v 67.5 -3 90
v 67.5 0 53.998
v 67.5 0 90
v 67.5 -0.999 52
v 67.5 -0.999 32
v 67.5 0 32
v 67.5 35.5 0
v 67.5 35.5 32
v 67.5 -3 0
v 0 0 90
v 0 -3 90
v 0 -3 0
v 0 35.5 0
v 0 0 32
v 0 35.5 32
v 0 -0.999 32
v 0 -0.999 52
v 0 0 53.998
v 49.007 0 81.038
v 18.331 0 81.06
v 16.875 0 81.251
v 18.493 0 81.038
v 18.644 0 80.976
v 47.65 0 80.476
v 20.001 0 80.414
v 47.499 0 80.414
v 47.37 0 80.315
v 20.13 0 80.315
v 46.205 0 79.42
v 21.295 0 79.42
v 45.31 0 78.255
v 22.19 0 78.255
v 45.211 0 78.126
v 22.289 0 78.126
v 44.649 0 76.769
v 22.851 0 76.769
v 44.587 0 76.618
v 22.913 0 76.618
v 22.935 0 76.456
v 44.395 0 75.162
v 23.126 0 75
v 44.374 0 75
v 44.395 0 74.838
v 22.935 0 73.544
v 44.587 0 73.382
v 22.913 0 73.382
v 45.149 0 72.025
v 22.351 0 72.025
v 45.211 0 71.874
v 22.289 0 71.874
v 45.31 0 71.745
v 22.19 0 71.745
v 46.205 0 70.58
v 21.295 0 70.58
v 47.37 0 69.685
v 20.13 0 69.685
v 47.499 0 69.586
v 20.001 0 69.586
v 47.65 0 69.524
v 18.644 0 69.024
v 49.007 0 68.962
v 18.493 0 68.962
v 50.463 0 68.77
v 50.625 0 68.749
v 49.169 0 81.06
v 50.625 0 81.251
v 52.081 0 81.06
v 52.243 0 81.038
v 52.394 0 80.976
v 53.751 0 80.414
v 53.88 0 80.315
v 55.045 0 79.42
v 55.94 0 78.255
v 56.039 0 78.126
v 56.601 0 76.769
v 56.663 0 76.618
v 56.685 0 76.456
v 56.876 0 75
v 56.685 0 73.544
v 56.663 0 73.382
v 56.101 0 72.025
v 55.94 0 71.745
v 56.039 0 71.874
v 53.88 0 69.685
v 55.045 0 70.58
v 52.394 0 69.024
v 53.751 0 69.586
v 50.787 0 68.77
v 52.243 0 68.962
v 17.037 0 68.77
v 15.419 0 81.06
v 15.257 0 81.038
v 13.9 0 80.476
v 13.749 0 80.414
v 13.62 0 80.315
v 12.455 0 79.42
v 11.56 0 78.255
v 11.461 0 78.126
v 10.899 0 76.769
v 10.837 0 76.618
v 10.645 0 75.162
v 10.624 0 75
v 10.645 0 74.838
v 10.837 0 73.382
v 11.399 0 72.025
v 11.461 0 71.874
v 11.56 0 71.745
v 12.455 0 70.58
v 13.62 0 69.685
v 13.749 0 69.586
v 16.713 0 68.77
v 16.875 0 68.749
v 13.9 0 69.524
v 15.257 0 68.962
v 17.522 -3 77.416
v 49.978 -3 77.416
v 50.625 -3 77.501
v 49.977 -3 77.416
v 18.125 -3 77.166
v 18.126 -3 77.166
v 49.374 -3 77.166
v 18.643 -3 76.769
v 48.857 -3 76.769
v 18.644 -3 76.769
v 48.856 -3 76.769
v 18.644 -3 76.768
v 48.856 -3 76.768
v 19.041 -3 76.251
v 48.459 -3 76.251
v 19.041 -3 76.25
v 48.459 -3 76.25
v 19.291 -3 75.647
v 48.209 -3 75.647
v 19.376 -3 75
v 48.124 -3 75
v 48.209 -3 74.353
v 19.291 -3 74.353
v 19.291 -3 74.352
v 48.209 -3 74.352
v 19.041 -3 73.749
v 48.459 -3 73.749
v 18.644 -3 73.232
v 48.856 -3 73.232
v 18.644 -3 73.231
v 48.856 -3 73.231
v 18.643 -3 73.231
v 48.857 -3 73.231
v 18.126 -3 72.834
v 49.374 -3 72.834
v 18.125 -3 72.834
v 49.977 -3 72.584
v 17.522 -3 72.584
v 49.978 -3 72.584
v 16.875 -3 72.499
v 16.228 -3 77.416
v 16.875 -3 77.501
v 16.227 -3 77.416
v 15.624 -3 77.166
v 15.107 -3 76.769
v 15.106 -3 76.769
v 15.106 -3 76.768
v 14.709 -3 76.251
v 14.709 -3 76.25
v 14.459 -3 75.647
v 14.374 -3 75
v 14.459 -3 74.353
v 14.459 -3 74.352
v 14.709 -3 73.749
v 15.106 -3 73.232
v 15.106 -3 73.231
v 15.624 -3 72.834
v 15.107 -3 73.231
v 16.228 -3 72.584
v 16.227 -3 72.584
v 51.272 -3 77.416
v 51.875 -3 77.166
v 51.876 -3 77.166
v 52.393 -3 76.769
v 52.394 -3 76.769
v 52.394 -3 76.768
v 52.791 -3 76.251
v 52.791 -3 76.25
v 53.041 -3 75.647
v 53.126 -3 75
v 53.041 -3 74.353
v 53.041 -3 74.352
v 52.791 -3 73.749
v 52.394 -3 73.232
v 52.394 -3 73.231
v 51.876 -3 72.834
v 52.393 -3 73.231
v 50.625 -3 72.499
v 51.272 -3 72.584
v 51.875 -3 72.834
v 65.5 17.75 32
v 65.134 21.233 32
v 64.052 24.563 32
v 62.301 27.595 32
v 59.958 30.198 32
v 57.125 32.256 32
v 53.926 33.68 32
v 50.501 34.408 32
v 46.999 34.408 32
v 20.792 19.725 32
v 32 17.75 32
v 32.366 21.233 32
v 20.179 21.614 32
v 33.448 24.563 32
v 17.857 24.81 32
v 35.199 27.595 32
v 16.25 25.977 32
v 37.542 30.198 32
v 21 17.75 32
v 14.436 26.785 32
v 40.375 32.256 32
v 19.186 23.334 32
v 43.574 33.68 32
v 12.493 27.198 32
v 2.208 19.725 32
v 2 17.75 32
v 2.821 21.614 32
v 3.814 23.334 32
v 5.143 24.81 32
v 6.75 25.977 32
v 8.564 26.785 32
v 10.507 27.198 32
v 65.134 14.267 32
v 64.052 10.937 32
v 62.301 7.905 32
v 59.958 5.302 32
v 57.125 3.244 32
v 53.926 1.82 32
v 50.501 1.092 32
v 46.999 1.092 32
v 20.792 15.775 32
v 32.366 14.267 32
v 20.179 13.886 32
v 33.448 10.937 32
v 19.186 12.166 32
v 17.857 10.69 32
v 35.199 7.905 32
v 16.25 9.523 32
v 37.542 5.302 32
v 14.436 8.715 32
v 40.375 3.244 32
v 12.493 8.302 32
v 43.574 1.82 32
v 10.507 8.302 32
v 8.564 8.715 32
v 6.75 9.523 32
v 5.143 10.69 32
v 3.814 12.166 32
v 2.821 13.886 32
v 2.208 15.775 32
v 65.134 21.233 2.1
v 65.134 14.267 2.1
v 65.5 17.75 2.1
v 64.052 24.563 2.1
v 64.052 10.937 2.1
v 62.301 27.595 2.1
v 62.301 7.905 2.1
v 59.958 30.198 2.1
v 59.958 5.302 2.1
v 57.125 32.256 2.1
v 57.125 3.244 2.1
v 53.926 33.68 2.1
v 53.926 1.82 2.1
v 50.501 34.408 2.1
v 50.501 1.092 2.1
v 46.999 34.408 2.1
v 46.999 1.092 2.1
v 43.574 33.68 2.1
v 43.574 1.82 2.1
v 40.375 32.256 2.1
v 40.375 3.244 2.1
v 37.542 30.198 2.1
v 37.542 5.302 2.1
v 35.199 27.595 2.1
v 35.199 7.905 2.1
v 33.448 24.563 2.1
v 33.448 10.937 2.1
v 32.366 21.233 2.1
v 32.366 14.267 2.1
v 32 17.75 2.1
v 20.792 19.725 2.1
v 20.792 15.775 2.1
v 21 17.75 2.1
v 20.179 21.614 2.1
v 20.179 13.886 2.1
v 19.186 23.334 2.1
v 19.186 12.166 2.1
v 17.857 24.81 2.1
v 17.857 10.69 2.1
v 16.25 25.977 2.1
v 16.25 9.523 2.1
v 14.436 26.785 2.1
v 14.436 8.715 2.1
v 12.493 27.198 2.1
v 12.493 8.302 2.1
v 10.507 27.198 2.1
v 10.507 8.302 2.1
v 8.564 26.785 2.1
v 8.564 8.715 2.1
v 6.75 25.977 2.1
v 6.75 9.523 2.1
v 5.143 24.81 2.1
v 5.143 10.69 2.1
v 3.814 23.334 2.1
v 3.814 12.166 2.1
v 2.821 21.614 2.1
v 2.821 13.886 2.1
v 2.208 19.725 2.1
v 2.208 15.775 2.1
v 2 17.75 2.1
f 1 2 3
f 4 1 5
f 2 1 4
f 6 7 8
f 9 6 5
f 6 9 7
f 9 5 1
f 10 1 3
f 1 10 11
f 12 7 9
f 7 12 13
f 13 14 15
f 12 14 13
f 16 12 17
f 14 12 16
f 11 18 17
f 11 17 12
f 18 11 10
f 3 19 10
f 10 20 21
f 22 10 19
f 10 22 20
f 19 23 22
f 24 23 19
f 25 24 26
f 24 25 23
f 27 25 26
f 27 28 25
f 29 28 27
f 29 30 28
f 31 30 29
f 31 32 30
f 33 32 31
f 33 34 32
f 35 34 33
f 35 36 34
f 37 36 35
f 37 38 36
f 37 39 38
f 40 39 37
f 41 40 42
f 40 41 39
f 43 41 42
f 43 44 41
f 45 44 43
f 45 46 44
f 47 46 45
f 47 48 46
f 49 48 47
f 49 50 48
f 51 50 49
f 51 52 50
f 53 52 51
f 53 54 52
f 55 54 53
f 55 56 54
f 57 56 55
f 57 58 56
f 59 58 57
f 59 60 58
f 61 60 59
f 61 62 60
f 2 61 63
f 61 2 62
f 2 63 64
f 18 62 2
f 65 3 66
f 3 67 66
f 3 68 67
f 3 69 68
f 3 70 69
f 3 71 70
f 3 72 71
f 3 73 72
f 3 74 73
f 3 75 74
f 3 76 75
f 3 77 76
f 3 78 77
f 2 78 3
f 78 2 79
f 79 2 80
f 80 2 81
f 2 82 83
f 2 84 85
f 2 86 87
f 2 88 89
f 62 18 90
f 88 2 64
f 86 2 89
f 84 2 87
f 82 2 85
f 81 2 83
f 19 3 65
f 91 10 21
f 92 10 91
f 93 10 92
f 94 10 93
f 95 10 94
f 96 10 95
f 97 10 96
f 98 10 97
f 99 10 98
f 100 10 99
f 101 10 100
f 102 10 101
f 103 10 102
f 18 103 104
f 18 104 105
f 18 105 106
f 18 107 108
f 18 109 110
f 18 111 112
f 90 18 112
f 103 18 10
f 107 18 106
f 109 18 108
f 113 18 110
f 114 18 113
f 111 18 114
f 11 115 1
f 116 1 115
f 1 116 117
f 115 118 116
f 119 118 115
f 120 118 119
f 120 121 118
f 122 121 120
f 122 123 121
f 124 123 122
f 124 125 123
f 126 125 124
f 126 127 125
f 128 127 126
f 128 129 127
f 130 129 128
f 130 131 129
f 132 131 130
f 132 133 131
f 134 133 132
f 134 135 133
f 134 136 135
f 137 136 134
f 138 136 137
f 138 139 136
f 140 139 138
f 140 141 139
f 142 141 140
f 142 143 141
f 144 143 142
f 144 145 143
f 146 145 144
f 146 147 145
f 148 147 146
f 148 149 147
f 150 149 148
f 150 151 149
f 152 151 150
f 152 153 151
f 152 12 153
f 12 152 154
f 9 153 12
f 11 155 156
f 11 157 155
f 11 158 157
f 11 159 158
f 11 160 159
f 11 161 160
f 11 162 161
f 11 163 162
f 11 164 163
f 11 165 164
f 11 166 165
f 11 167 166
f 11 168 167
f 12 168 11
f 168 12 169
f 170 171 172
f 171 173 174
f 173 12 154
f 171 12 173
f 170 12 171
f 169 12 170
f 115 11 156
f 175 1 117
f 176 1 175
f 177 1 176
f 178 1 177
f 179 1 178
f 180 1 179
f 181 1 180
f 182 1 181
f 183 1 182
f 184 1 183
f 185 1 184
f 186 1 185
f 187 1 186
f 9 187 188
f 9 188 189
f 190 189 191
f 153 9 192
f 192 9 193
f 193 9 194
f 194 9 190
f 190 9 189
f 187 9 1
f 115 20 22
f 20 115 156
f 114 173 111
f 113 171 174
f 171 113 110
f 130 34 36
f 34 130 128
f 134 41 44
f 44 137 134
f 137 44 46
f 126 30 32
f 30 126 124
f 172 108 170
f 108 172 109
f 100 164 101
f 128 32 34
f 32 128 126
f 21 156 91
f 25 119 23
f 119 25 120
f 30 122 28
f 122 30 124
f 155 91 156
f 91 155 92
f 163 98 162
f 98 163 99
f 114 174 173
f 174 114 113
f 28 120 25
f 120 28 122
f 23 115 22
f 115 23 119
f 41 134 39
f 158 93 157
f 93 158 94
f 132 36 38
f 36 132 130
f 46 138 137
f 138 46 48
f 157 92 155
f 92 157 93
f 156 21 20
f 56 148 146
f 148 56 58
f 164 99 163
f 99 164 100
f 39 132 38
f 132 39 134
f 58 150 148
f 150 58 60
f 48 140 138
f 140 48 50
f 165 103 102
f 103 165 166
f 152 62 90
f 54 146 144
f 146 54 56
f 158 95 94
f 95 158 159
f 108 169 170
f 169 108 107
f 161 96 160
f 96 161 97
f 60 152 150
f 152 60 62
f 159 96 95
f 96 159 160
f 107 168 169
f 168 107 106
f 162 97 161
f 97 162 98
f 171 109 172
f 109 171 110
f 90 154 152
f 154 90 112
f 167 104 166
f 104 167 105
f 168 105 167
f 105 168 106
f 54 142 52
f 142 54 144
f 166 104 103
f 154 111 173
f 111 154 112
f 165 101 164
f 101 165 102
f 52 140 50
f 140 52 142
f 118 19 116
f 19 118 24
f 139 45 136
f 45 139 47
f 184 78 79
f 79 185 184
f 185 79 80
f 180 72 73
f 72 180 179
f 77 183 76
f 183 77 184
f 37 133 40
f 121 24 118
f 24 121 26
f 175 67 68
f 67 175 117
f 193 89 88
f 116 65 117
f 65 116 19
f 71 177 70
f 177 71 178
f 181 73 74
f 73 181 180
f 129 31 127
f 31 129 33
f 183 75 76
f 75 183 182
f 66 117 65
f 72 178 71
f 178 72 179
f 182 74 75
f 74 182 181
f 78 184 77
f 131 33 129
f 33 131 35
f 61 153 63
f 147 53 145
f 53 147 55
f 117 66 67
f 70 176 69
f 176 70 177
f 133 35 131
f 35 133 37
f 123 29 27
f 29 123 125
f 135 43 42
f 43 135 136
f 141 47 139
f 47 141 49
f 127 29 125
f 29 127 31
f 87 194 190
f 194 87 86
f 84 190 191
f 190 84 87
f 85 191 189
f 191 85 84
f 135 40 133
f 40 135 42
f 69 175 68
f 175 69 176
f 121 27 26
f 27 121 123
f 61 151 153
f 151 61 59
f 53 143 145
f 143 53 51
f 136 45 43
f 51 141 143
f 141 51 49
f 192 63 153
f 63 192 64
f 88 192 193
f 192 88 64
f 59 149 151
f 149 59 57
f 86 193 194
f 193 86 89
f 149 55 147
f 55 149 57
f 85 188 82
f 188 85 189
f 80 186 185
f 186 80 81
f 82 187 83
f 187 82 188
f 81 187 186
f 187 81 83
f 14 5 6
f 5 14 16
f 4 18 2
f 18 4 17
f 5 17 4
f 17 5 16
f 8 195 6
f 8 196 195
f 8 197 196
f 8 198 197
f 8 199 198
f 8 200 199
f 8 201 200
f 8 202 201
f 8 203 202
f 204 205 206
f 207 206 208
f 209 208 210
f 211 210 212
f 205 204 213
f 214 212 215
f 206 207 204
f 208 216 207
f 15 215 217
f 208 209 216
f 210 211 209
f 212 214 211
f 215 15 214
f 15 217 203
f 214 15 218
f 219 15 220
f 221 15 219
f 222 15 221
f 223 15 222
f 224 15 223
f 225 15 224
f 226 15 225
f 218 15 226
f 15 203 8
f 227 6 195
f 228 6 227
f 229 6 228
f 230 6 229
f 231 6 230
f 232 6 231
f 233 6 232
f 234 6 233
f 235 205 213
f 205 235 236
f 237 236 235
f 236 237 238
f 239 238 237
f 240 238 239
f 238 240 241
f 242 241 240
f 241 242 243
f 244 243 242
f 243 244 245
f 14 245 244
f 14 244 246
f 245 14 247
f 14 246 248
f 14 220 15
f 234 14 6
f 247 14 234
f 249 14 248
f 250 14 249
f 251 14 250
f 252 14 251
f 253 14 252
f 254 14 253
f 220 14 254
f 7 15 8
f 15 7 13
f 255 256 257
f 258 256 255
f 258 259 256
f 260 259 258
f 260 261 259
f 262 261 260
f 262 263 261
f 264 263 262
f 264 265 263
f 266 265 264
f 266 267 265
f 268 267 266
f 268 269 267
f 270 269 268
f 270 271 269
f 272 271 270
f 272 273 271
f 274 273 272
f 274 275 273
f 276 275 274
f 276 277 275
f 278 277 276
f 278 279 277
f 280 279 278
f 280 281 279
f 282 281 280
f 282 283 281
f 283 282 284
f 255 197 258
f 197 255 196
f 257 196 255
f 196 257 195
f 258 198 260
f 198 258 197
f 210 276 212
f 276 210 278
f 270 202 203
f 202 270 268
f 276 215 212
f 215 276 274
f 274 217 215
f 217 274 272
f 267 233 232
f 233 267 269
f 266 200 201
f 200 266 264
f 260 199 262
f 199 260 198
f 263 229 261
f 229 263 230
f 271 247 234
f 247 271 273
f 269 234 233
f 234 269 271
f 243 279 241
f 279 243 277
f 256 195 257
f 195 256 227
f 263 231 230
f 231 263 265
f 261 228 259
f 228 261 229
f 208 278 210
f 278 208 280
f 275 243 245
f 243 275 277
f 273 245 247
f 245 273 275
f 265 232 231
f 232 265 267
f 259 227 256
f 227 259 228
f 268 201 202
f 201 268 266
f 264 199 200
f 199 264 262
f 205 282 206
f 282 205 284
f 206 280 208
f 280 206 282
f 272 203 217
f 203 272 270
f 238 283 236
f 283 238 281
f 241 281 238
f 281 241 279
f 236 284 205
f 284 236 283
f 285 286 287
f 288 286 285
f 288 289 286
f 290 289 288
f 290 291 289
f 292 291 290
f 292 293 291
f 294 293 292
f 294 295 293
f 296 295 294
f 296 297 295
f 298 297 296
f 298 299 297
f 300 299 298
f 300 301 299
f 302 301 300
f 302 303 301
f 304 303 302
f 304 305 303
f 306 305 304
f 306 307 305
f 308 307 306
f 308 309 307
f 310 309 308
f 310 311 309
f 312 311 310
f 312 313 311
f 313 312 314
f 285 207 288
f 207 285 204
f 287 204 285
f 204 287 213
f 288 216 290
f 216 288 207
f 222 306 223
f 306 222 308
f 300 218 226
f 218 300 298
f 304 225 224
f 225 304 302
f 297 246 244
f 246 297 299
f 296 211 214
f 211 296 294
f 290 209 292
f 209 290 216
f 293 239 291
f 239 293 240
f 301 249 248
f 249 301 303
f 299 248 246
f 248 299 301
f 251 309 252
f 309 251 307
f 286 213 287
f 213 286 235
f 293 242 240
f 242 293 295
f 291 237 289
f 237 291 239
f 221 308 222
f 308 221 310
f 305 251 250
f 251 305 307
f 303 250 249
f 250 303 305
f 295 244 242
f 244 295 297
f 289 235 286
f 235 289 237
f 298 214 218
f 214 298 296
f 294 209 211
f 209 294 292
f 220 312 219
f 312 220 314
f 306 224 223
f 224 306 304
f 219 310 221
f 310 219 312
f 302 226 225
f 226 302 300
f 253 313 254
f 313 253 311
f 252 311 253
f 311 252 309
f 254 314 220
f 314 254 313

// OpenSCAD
// Object parameters

/* [Battery and torch sizes] */
battery_diameter = 19; // [10:40]
torch_diameter = 33.5; // [10:100]

/* [Thickness of base and total height of base] */
base_thickness = 2; // [1:10]
base_height = 30; // [15:50]
back_thickness = 3; // [2:10]

/* [Screw hole sizes] */
screw_size = 5; // [2:10]

/* [Tape details] */
allow_tape = true; // [true, false]
tape_width = 20; // [10:50]
tape_thickness = 1; // [1:5]

total_width = battery_diameter + torch_diameter + 15;

inset_points = [
            [0,0,0],
            [(total_width + 1),0,0],
            [(total_width + 1),tape_thickness,0],
            [0,tape_thickness,0],
            [0,0,tape_width],
            [(total_width + 1),0,tape_width],
            [(total_width + 1),tape_thickness,tape_width+2],
            [0,tape_thickness,tape_width+2]];
            
inset_faces = [
            [0,1,2,3],  // bottom
            [4,5,1,0],  // front
            [7,6,5,4],  // top
            [5,6,2,1],  // right
            [6,7,3,2],  // back
            [7,4,0,3]]; // left




union() {
    translate([0,-back_thickness,0])
    difference() {
        cube([total_width,back_thickness,(base_height*3)]);
        translate([total_width*0.25, -0.001, (base_height*2.5) ])
            rotate(a=[-90,0,0]) 
                cylinder(back_thickness+1,d1=screw_size,d2=screw_size*3,false);
        translate([total_width*0.75, -0.001, (base_height*2.5) ])
            rotate(a=[-90,0,0]) 
                cylinder(back_thickness+1,d1=screw_size,d2=screw_size*3,false);
        if (allow_tape) {
            translate([-0.001,back_thickness-(tape_thickness-0.001),base_height+base_thickness])
                polyhedron( inset_points, inset_faces );
        }
    }
    difference() {
        cube([(total_width),(torch_diameter + base_thickness),(base_height+base_thickness)]);
        translate([(total_width)-((torch_diameter/2)+base_thickness), (torch_diameter + base_thickness)/2, base_thickness + (base_height/2) + 0.1 ])
            cylinder(base_height,(torch_diameter/2),(torch_diameter/2),true);
        if (torch_diameter/battery_diameter > 2.25) {
             translate([(battery_diameter/2)+base_thickness, (torch_diameter + base_thickness)/4, base_thickness + (base_height/2) + 0.1 ]) 
                cylinder(base_height,(battery_diameter/2),(battery_diameter/2),true);  
             translate([(battery_diameter/2)+base_thickness, 3*(torch_diameter + base_thickness)/4, base_thickness + (base_height/2) + 0.1 ]) 
                cylinder(base_height,(battery_diameter/2),(battery_diameter/2),true);         
        } else {
            translate([(battery_diameter/2)+base_thickness, (torch_diameter + base_thickness)/2, base_thickness + (base_height/2) + 0.1 ]) 
                cylinder(base_height,(battery_diameter/2),(battery_diameter/2),true);
        }

    }
}
